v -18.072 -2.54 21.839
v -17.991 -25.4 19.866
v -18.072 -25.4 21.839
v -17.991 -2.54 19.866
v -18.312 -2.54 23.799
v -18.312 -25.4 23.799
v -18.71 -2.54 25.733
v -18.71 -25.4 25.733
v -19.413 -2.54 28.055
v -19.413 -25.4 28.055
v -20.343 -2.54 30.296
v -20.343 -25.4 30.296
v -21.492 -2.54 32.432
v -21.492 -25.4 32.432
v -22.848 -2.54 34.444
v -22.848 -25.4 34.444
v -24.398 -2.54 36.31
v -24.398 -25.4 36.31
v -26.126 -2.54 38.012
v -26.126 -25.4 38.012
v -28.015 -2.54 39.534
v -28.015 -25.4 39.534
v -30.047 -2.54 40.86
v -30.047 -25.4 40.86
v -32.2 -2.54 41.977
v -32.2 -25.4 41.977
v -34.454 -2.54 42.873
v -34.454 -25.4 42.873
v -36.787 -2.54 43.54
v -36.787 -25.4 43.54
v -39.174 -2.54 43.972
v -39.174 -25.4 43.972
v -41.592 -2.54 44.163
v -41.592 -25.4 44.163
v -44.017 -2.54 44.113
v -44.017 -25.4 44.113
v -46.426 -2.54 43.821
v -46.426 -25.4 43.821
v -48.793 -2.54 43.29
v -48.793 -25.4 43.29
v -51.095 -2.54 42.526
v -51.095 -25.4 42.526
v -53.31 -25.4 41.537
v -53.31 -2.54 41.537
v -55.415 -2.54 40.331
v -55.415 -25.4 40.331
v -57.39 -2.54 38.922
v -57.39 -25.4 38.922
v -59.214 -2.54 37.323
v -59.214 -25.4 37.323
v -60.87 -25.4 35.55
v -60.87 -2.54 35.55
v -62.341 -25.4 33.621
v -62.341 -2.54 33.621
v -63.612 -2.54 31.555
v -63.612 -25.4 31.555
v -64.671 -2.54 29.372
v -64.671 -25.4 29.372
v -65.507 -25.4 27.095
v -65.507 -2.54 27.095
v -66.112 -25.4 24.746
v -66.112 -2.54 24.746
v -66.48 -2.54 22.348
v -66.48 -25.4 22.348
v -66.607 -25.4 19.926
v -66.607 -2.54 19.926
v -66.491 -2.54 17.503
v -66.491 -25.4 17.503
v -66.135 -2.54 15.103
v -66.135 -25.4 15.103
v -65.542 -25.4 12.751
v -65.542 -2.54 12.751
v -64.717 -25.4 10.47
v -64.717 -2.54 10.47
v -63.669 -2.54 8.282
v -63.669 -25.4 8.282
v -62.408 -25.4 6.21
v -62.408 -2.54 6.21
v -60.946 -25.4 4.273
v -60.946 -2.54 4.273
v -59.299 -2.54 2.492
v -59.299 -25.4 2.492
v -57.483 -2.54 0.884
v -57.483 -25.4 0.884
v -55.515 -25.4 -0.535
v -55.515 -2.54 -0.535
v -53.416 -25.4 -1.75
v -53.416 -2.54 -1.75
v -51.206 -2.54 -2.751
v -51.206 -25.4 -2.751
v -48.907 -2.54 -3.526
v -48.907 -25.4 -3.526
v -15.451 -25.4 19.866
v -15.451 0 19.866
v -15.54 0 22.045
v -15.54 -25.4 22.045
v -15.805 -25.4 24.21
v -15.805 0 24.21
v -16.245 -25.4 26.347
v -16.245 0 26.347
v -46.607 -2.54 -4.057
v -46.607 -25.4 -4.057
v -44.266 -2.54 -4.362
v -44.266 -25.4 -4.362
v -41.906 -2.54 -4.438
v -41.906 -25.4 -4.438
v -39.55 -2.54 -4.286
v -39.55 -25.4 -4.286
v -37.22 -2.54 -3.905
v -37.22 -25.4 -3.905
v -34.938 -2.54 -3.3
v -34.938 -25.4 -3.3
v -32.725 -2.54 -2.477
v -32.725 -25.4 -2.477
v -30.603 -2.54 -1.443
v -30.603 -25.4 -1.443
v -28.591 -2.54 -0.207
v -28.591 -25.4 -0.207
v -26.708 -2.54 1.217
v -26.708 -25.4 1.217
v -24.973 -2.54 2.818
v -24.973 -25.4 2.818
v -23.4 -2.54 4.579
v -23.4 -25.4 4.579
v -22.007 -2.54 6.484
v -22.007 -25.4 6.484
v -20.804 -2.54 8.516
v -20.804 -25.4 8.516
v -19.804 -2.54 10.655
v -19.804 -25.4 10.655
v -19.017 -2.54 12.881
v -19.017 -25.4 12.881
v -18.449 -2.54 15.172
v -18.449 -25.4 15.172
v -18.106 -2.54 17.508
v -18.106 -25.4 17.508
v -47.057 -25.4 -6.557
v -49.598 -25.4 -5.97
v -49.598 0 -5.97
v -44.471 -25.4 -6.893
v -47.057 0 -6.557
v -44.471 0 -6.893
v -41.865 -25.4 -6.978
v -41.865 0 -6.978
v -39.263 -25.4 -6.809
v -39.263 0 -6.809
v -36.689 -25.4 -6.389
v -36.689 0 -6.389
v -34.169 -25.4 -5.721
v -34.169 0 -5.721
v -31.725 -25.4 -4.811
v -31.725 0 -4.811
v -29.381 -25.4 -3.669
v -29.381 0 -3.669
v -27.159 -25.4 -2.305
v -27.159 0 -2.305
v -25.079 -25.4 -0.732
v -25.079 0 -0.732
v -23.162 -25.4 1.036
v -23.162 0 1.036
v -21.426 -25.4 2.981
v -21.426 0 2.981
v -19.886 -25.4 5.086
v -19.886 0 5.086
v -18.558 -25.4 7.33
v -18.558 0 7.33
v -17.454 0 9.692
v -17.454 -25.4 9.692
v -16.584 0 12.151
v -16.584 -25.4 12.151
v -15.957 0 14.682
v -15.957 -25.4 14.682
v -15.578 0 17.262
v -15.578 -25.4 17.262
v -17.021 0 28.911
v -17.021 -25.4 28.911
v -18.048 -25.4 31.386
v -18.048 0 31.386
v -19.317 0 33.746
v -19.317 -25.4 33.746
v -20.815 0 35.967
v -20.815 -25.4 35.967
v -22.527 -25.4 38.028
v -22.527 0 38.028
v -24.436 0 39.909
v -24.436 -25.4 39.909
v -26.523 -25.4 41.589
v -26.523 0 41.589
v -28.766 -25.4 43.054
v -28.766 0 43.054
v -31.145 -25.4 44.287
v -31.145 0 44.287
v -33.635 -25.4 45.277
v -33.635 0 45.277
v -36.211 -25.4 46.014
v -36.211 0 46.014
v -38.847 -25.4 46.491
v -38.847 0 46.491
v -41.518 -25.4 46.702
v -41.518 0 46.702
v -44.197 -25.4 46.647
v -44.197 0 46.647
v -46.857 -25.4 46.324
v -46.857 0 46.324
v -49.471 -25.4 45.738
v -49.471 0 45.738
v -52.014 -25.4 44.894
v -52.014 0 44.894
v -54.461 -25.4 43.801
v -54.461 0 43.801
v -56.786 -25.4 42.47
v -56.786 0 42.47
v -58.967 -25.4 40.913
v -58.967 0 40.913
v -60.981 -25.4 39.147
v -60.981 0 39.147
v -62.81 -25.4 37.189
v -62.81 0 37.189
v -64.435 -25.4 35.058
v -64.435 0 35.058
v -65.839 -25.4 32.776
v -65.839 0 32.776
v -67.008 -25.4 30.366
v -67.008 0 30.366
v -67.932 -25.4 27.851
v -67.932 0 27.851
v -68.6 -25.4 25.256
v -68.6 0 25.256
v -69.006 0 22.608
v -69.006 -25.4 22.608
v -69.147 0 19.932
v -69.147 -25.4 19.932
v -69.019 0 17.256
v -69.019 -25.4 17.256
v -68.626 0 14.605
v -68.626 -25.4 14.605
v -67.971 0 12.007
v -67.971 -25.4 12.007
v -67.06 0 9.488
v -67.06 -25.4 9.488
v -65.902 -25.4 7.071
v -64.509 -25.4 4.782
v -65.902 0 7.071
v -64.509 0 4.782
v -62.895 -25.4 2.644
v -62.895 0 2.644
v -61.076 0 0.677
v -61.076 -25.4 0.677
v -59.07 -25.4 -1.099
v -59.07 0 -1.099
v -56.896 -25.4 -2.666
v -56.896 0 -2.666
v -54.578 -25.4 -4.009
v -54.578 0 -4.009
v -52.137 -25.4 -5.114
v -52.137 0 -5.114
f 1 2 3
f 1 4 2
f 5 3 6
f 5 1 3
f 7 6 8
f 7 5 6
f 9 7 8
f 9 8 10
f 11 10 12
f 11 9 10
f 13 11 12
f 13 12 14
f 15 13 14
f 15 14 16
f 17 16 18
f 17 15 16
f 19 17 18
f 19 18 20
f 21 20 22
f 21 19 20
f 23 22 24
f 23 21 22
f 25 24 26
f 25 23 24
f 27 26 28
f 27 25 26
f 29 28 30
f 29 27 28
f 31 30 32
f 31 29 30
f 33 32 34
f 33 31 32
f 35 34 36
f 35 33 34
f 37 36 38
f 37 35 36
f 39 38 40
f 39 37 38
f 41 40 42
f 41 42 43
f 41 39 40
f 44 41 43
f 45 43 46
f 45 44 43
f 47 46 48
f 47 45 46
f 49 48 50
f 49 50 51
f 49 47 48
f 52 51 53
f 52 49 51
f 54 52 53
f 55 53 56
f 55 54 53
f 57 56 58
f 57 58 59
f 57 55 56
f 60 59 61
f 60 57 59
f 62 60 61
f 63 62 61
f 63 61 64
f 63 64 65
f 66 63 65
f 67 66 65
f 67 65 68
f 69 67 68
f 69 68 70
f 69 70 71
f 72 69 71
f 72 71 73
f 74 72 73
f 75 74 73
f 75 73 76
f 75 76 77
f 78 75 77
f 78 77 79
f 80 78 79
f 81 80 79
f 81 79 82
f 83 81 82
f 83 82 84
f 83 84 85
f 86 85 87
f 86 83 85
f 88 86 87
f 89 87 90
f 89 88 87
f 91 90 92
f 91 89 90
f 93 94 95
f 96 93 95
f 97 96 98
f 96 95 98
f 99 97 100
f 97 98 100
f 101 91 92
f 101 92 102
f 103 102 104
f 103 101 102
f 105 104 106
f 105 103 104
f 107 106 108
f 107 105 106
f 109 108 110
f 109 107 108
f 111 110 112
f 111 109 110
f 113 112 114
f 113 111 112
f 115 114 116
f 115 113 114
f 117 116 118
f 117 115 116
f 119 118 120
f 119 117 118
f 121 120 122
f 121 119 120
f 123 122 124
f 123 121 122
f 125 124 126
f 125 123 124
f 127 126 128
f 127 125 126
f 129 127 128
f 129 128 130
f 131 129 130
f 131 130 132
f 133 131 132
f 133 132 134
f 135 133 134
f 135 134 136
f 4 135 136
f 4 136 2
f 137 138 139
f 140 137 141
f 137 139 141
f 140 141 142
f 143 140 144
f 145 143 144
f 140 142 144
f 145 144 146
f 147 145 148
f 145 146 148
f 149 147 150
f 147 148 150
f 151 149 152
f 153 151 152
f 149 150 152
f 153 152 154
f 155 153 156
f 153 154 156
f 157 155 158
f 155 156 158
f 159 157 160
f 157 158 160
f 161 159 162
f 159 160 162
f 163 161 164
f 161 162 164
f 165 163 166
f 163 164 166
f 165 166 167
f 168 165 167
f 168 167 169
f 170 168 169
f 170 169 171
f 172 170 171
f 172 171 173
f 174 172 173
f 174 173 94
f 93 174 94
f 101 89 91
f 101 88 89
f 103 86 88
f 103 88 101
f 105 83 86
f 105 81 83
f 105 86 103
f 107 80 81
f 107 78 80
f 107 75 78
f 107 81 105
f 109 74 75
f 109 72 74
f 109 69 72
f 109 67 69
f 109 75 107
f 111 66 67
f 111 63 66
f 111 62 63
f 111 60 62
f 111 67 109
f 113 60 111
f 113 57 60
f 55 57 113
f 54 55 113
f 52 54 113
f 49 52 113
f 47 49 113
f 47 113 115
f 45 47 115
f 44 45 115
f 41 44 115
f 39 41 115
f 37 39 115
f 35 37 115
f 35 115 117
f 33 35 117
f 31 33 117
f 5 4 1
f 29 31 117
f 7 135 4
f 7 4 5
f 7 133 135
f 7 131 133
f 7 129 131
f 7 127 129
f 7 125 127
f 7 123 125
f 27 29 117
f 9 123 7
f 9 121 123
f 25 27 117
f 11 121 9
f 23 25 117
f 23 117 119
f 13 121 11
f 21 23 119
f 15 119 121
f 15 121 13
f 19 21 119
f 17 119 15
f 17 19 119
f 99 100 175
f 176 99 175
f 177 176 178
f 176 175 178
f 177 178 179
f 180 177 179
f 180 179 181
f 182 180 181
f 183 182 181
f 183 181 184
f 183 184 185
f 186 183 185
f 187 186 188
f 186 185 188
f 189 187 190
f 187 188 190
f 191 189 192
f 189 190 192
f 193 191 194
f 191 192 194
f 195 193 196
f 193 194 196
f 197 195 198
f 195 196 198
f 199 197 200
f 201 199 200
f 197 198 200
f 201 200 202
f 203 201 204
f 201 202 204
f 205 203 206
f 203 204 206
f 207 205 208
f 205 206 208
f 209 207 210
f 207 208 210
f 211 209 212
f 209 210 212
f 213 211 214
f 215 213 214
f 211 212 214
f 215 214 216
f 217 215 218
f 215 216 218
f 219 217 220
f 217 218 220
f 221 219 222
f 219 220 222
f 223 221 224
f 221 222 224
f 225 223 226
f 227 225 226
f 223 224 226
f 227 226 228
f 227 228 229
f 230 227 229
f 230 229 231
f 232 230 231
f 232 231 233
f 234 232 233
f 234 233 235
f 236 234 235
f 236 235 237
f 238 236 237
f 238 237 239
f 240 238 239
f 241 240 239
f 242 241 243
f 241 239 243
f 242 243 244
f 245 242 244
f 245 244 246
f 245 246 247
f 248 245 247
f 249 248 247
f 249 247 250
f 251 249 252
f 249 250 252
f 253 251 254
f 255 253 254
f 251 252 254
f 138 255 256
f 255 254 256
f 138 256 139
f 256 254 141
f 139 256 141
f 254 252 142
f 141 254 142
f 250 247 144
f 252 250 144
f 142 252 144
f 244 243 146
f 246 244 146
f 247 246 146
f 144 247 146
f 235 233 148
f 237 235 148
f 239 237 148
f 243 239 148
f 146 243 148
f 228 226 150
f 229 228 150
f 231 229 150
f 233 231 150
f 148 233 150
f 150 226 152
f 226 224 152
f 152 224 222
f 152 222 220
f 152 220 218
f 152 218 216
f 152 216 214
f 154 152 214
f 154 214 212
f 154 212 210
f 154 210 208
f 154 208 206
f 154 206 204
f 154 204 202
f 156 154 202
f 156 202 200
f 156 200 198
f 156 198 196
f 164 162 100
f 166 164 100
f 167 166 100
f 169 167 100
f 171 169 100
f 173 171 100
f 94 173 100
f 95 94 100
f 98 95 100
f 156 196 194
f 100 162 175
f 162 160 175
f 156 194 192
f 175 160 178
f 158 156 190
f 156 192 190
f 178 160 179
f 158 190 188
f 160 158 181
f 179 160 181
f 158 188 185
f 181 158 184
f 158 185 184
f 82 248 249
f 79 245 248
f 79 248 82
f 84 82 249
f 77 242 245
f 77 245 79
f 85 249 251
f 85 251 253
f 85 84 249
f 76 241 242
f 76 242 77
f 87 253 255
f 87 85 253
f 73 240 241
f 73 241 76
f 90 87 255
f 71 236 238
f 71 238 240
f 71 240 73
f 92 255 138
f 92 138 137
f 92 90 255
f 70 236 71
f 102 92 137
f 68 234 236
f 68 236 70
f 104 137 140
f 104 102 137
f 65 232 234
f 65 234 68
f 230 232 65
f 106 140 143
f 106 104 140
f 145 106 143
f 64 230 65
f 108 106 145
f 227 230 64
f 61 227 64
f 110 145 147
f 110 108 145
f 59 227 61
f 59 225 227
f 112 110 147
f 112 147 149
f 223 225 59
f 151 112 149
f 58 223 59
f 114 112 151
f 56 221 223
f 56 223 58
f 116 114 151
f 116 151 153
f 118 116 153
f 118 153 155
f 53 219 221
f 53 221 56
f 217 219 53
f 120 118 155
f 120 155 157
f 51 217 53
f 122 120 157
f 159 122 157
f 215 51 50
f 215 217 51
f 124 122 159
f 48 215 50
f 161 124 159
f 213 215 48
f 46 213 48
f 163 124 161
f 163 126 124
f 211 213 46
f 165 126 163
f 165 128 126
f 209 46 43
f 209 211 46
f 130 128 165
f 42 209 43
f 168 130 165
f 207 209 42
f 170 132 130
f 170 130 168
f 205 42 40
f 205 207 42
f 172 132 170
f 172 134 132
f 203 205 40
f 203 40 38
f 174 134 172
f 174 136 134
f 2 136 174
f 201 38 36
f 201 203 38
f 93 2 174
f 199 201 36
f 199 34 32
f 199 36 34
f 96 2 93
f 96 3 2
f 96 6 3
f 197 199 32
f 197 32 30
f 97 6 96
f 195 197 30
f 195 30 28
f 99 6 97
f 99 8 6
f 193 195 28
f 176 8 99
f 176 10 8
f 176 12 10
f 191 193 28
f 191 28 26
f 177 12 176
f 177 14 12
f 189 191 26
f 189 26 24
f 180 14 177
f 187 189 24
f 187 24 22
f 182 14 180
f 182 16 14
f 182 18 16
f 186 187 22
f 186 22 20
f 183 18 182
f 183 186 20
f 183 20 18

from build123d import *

# Parameters (mm, degrees)
F1_DEPTH = 25.4
F2_T     = -2.54


with BuildPart() as f1:
    # F0 (on Front) → F1 (new body)
    with BuildSketch(Plane.XZ):
        with BuildLine():
            ThreePointArc((-49.597935, -5.970298), (-42.262804, 19.828677), (-16.245349, 26.3466))
            ThreePointArc((-16.245349, 26.3466), (-60.981474, 39.147241), (-49.597935, -5.970298))
        make_face()
        with BuildLine():
            ThreePointArc((-49.597935, -5.970298), (-26.099746, -1.543581), (-15.451481, 19.866116))
            ThreePointArc((-15.451481, 19.866116), (-15.650687, 23.13058), (-16.245349, 26.3466))
            ThreePointArc((-16.245349, 26.3466), (-42.262804, 19.828677), (-49.597935, -5.970298))
        make_face()
    extrude(amount=F1_DEPTH)

    # F2
    f2_openings = [f1.faces().sort_by_distance(p)[0] for p in [
        (-42.299081, -25.4, 19.866116),
    ]]
    offset(amount=F2_T, openings=f2_openings)


solid = f1.part
